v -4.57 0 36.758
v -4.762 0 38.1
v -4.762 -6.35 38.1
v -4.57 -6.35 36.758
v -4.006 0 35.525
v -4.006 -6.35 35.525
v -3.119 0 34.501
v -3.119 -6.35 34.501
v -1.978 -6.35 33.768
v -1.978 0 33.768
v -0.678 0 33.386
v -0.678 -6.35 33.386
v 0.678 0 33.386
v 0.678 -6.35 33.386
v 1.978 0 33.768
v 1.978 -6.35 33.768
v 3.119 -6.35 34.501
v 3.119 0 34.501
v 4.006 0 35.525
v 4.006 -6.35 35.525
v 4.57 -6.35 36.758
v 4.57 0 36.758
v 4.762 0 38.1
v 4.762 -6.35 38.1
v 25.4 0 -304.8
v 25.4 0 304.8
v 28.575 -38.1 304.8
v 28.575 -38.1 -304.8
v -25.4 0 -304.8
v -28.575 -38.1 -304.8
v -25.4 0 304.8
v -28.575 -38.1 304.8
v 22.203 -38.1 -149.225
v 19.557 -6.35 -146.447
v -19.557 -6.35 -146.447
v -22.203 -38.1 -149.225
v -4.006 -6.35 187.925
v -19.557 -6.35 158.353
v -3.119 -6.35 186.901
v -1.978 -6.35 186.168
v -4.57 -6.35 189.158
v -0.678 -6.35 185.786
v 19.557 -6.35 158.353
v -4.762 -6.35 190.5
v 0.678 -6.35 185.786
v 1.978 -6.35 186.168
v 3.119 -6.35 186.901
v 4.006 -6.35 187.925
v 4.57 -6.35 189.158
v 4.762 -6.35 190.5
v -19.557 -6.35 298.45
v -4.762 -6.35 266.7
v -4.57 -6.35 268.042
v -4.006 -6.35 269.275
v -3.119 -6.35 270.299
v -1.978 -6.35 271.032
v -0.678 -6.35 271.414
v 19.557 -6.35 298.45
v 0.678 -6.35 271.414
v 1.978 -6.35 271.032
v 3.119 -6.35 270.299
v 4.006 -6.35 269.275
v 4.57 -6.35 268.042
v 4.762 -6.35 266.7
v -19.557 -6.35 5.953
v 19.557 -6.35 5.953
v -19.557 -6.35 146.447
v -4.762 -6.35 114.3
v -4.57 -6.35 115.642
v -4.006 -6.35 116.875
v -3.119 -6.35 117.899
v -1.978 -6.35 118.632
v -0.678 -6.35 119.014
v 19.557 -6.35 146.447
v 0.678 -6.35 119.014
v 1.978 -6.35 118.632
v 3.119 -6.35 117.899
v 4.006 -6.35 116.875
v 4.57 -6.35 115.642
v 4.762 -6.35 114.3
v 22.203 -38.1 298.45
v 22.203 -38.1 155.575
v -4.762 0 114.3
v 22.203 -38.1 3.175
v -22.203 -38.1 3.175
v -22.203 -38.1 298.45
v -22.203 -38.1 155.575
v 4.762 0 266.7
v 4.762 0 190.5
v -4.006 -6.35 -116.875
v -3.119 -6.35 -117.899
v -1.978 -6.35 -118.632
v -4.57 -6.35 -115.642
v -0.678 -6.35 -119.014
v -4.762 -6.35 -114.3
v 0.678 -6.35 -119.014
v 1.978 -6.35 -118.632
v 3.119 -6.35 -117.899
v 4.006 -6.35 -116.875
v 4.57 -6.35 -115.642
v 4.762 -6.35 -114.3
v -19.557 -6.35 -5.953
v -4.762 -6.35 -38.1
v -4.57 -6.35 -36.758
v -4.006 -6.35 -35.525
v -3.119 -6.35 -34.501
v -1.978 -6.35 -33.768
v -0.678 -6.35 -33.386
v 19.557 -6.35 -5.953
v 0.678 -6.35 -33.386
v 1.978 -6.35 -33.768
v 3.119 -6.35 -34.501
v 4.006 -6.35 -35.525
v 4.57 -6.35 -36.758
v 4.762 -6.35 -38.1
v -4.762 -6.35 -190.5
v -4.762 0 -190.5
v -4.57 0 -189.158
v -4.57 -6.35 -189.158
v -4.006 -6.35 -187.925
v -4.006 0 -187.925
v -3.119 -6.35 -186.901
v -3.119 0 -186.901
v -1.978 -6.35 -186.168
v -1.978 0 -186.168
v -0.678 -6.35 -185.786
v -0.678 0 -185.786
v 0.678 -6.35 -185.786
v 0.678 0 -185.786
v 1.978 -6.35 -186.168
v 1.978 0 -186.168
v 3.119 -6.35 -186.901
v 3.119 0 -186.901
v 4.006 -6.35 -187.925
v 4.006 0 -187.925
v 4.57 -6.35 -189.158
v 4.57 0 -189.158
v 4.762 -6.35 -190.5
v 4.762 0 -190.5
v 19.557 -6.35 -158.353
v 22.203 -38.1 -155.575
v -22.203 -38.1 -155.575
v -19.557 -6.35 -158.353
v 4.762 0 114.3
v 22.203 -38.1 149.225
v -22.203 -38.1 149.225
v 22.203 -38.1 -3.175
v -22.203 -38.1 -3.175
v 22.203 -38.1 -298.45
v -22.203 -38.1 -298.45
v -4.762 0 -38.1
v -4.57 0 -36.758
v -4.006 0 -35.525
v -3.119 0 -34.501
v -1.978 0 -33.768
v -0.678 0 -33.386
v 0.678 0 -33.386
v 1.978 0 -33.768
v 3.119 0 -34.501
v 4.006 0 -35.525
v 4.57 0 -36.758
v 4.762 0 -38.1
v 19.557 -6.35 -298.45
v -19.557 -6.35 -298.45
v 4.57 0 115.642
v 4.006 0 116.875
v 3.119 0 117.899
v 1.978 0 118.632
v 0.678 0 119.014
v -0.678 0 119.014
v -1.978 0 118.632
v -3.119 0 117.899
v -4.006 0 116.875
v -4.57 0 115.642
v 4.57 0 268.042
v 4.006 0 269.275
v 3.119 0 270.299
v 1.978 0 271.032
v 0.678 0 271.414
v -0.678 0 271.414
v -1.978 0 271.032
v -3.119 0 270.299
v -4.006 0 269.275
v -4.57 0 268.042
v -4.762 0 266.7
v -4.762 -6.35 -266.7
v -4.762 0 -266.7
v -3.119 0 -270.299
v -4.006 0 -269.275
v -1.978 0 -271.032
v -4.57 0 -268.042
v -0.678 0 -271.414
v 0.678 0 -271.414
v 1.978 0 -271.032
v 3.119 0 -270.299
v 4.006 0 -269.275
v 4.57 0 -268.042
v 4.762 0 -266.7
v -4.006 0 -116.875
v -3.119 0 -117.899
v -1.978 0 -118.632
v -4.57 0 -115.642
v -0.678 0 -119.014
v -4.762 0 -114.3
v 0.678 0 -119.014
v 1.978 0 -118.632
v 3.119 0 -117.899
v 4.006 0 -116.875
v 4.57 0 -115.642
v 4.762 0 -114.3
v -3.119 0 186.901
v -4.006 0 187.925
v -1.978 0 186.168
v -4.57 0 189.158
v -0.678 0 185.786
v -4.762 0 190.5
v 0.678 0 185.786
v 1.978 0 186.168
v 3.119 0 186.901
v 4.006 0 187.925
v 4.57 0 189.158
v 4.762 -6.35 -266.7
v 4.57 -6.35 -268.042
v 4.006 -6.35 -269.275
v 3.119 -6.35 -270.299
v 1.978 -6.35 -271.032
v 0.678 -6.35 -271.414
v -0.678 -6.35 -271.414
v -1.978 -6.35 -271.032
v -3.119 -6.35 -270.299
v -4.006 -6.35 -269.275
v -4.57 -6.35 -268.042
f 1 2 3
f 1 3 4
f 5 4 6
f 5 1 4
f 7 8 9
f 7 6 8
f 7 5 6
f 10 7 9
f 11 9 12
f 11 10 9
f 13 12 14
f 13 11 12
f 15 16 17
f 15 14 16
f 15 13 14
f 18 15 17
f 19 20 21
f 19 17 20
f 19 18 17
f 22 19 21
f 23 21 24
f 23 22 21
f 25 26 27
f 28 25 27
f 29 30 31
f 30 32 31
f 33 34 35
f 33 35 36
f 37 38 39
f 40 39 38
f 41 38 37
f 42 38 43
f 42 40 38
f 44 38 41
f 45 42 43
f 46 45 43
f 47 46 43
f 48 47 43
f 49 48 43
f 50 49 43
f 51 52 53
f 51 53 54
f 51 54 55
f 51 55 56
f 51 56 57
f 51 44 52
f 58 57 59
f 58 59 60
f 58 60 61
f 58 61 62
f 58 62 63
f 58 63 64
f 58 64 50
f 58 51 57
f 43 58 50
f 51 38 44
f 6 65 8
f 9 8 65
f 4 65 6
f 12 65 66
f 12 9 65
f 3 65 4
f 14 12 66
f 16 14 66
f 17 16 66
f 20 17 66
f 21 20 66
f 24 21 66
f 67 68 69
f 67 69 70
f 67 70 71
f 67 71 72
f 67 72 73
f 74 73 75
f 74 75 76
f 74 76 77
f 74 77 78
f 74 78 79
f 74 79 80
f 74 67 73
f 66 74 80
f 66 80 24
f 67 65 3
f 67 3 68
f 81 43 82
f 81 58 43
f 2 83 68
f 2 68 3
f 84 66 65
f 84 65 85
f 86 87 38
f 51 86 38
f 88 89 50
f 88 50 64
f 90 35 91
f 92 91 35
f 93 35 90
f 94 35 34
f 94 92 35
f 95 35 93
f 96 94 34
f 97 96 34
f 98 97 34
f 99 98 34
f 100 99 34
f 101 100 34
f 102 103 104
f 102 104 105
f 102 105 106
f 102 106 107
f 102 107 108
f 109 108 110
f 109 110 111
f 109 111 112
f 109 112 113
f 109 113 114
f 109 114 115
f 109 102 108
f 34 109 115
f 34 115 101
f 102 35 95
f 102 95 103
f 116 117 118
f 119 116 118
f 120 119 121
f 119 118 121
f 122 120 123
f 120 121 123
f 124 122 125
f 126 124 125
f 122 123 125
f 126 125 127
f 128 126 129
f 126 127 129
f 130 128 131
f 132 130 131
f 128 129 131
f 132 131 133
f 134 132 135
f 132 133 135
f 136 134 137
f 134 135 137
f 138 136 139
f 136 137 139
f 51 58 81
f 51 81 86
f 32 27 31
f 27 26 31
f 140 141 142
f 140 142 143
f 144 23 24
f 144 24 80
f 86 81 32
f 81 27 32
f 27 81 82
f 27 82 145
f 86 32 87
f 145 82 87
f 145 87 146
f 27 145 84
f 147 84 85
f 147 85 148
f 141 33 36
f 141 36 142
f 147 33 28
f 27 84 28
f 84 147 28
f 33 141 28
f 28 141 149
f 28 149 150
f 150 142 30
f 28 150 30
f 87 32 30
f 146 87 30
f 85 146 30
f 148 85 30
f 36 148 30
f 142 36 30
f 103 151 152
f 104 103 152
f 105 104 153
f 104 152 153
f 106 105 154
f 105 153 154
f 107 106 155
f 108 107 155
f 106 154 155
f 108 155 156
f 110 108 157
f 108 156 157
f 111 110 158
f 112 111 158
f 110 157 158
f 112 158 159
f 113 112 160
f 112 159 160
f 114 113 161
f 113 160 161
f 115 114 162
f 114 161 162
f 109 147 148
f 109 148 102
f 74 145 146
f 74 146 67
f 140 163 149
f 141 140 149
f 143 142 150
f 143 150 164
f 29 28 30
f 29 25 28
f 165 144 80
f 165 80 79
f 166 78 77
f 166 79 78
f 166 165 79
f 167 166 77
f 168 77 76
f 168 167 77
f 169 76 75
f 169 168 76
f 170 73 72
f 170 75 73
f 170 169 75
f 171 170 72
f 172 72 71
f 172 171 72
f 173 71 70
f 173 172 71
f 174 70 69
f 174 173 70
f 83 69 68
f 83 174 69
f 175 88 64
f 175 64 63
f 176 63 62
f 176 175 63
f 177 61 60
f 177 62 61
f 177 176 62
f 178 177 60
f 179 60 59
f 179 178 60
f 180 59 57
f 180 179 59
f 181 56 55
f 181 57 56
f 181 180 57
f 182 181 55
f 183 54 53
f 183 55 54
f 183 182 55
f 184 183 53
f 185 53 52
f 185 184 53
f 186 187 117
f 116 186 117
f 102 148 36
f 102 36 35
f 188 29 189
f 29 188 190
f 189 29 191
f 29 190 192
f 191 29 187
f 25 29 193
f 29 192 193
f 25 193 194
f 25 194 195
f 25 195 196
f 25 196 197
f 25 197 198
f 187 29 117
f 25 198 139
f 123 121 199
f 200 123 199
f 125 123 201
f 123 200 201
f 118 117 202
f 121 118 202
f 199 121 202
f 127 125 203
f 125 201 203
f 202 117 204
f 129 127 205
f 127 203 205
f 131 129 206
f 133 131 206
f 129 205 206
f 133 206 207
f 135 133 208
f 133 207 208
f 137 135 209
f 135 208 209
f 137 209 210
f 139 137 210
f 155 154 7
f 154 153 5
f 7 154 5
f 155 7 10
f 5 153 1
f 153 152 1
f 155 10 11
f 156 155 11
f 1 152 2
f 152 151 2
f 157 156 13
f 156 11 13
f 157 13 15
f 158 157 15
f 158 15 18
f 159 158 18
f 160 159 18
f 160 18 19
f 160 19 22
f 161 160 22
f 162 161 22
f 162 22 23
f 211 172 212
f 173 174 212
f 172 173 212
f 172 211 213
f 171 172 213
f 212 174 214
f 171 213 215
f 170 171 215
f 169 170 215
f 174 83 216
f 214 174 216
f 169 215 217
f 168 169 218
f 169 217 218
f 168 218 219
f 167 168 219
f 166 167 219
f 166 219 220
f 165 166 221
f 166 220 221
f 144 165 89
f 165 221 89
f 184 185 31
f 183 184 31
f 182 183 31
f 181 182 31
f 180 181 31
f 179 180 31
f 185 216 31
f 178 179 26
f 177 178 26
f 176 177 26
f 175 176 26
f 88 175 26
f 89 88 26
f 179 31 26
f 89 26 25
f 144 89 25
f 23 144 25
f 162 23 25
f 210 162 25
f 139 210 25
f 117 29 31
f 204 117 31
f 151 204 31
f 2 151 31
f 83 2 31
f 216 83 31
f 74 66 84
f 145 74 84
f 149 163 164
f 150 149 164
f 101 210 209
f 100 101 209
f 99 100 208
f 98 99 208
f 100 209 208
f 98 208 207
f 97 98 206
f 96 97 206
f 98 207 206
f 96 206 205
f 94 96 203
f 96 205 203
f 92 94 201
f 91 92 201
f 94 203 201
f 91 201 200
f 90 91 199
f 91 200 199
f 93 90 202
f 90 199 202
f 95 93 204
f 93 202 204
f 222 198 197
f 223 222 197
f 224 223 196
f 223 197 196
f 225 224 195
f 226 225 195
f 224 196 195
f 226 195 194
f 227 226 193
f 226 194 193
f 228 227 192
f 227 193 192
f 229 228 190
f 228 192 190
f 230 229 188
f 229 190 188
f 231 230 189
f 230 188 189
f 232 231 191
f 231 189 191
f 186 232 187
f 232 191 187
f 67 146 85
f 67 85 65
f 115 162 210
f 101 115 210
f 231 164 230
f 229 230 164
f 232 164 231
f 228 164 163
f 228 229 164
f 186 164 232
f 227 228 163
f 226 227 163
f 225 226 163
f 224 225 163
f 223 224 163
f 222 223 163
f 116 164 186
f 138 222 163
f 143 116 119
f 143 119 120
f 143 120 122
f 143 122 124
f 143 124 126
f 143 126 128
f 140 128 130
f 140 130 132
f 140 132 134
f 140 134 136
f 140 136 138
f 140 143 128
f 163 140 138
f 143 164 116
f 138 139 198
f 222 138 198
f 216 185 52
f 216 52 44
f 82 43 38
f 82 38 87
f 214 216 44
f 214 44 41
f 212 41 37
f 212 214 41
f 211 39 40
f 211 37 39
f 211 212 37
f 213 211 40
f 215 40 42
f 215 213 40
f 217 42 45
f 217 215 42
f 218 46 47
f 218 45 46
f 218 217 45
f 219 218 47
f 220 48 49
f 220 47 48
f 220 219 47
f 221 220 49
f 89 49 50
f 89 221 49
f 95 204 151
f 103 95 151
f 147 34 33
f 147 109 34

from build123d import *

# Parameters (mm, degrees)
BOSS_EXTRUDE1_DEPTH  = 304.8
SHELL1_T             = -6.35
CUT_EXTRUDE1_DEPTH   = 309.49826681
RIB2_START           = -22.202989535
RIB2_DEPTH           = 44.40597907
LPATTERN1_COUNT      = 3
LPATTERN1_PITCH      = 152.4
LPATTERN2_COUNT      = 2
LPATTERN2_PITCH      = 152.4
MIRROR1_COPY_1_DEPTH = 309.49826681


# Read off the part's stored shape, not the designer's step: Rib2
with BuildPart() as part:
    # Sketch1 → Boss-Extrude1 (new, symmetric)
    with BuildSketch(Plane.XY):
        Polygon((28.575, -38.1), (-28.575, -38.1), (-25.4, 0), (25.4, 0), align=None)
    extrude(amount=BOSS_EXTRUDE1_DEPTH, both=True)

    # Shell1
    shell1_openings = [part.faces().sort_by_distance(p)[0] for p in [
        (0, -38.1, 0),
    ]]
    offset(amount=SHELL1_T, openings=shell1_openings, kind=Kind.INTERSECTION)

    # Sketch2 → Cut-Extrude1 (cut, symmetric)
    with BuildSketch(Plane(origin=(0, 0, 0), x_dir=(1, 0, 0), z_dir=(0, 1, 0))):
        with BuildLine():
            Line((4.7625, -38.1), (4.7625, -114.3))
            ThreePointArc((4.7625, -114.3), (0, -119.0625), (-4.7625, -114.3))
            Line((-4.7625, -114.3), (-4.7625, -38.1))
            ThreePointArc((-4.7625, -38.1), (0, -33.3375), (4.7625, -38.1))
        make_face()
    cut_extrude1 = extrude(amount=CUT_EXTRUDE1_DEPTH, both=True, mode=Mode.SUBTRACT)

    # Rib2 outline → Rib2 (add)
    with BuildSketch(Plane.YZ.offset(RIB2_START)):
        Polygon((-6.35, 146.447234933), (-6.35, 158.352765067), (-38.1, 155.575), (-38.1, 149.225), align=None)
    rib2 = extrude(amount=RIB2_DEPTH)

    # LPattern1: Rib2 ×3
    with Locations(*[(0, 0, -i * LPATTERN1_PITCH) for i in range(1, LPATTERN1_COUNT)]):
        add(rib2)

    # LPattern2: Cut-Extrude1 ×2
    with Locations(*[(0, 0, i * LPATTERN2_PITCH) for i in range(1, LPATTERN2_COUNT)]):
        add(cut_extrude1, mode=Mode.SUBTRACT)

    # Mirror1: Cut-Extrude1 across plane
    add(cut_extrude1.mirror(Plane.XY), mode=Mode.SUBTRACT)

    # Mirror1 copy 1 sketch → Mirror1 copy 1 (cut, symmetric)
    with BuildSketch(Plane(origin=(0, 0, -152.4), x_dir=(1, 0, 0), z_dir=(0, 1, 0))):
        with BuildLine():
            Line((4.7625, 38.1), (4.7625, 114.3))
            ThreePointArc((4.7625, 114.3), (0, 119.0625), (-4.7625, 114.3))
            Line((-4.7625, 114.3), (-4.7625, 38.1))
            ThreePointArc((-4.7625, 38.1), (0, 33.3375), (4.7625, 38.1))
        make_face()
    extrude(amount=MIRROR1_COPY_1_DEPTH, both=True, mode=Mode.SUBTRACT)


solid = part.part
